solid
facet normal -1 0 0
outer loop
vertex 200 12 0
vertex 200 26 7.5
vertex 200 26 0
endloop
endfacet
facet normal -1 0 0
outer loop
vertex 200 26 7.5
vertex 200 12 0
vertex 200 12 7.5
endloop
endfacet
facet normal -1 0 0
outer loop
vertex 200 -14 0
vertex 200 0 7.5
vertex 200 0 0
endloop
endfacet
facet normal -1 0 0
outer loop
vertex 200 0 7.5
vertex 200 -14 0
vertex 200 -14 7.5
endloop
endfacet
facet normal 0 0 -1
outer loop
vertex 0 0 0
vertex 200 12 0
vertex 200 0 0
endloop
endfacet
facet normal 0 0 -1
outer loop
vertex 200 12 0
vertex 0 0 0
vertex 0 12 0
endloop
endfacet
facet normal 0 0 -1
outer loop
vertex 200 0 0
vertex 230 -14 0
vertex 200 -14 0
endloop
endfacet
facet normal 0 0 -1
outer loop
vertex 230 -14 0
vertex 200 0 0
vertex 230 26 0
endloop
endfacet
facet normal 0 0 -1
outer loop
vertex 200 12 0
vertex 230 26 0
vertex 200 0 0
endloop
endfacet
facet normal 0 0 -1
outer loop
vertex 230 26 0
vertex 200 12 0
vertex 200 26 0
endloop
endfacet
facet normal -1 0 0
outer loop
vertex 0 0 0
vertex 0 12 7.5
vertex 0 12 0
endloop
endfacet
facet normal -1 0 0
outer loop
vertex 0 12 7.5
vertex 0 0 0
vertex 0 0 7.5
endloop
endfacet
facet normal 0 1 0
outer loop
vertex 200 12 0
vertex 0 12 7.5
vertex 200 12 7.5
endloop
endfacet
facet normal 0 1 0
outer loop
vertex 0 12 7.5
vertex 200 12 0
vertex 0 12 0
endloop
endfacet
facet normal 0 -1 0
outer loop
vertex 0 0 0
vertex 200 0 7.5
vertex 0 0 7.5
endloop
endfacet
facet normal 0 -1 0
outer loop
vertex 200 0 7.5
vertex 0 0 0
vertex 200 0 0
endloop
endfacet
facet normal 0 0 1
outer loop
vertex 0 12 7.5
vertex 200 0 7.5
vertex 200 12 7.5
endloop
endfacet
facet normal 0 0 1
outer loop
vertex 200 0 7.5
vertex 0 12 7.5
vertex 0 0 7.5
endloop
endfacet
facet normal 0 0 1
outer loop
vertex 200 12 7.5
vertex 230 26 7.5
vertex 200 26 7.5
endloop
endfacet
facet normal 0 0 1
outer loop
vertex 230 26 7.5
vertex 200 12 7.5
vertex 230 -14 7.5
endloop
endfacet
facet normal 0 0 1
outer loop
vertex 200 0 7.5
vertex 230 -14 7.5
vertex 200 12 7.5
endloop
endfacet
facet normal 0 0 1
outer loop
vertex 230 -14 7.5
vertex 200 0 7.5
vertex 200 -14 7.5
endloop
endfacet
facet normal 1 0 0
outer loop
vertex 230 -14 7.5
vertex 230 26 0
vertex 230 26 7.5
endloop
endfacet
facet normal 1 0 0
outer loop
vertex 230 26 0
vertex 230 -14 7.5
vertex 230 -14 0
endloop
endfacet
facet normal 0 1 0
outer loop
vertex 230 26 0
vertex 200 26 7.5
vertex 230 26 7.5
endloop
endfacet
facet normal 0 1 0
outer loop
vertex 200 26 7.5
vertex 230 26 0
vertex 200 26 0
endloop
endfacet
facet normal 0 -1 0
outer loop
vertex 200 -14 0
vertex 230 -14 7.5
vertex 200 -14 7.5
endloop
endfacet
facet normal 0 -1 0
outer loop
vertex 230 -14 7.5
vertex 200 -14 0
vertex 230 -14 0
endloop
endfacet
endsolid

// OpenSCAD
// Global Resolution Setting
$fn = 64;

// ==============================
// Parameter Definitions (all units mm)
// ==============================
// Main Rail Dimensions
rail_length = 200;
rail_width = 12;
rail_base_height = 6;
rail_top_shelf_height = 1.5; // Shallow full-length top layer

// Rail End Recess Features
rail_recess_diameter = 6;
rail_recess_depth = 2;
rail_recess_edge_offset = 10; // Distance from rail end to recess center

// End Block Dimensions (wider extension at one end of rail)
end_block_length = 30;
end_block_total_width = 40;
end_block_top_shelf_height = rail_top_shelf_height; // Matches rail top layer

// End Block Feature Dimensions
end_block_shallow_recess_dia = 10;
end_block_shallow_recess_depth = rail_recess_depth;
end_block_deep_cutout_width = 15;
end_block_deep_cutout_length = 20;
end_block_deep_cutout_depth = 4.8; // Deep cut into base, creates stepped depth

// ==============================
// Main Model Assembly
// ==============================
difference() {
    // Union of all solid base geometry
    union() {
        // Main rail base body
        translate([0, 0, 0])
        cube([rail_length, rail_width, rail_base_height]);
        
        // Full-length shallow top rail layer
        translate([0, 0, rail_base_height])
        cube([rail_length, rail_width, rail_top_shelf_height]);
        
        // End block base (wider extension)
        translate([
            rail_length,
            -(end_block_total_width - rail_width)/2, // Center block on rail
            0
        ])
        cube([end_block_length, end_block_total_width, rail_base_height]);
        
        // End block matching shallow top layer
        translate([
            rail_length,
            -(end_block_total_width - rail_width)/2,
            rail_base_height
        ])
        cube([end_block_length, end_block_total_width, end_block_top_shelf_height]);
    }

    // ------------------------------
    // Removed Features (Cuts/Recesses)
    // ------------------------------
    // Left end rail recess
    translate([rail_recess_edge_offset, rail_width/2, rail_base_height + rail_top_shelf_height])
    cylinder(h=-rail_recess_depth - 0.1, d=rail_recess_diameter); // Extra 0.1 ensures clean cut
    
    // Right end rail recess (near end block)
    translate([rail_length - rail_recess_edge_offset, rail_width/2, rail_base_height + rail_top_shelf_height])
    cylinder(h=-rail_recess_depth - 0.1, d=rail_recess_diameter);
    
    // End block shallow circular recess
    translate([
        rail_length + end_block_length/2,
        rail_width/2, // Align with rail centerline
        rail_base_height + end_block_top_shelf_height
    ])
    cylinder(h=-end_block_shallow_recess_depth - 0.1, d=end_block_shallow_recess_dia);
    
    // End block deep cutout (stepped depth feature)
    translate([
        rail_length + (end_block_length - end_block_deep_cutout_length)/2,
        -end_block_deep_cutout_width/2,
        rail_base_height + end_block_top_shelf_height
    ])
    cube([
        end_block_deep_cutout_length,
        end_block_deep_cutout_width,
        -(end_block_top_shelf_height + end_block_deep_cutout_depth + 0.1)
    ]);
}
